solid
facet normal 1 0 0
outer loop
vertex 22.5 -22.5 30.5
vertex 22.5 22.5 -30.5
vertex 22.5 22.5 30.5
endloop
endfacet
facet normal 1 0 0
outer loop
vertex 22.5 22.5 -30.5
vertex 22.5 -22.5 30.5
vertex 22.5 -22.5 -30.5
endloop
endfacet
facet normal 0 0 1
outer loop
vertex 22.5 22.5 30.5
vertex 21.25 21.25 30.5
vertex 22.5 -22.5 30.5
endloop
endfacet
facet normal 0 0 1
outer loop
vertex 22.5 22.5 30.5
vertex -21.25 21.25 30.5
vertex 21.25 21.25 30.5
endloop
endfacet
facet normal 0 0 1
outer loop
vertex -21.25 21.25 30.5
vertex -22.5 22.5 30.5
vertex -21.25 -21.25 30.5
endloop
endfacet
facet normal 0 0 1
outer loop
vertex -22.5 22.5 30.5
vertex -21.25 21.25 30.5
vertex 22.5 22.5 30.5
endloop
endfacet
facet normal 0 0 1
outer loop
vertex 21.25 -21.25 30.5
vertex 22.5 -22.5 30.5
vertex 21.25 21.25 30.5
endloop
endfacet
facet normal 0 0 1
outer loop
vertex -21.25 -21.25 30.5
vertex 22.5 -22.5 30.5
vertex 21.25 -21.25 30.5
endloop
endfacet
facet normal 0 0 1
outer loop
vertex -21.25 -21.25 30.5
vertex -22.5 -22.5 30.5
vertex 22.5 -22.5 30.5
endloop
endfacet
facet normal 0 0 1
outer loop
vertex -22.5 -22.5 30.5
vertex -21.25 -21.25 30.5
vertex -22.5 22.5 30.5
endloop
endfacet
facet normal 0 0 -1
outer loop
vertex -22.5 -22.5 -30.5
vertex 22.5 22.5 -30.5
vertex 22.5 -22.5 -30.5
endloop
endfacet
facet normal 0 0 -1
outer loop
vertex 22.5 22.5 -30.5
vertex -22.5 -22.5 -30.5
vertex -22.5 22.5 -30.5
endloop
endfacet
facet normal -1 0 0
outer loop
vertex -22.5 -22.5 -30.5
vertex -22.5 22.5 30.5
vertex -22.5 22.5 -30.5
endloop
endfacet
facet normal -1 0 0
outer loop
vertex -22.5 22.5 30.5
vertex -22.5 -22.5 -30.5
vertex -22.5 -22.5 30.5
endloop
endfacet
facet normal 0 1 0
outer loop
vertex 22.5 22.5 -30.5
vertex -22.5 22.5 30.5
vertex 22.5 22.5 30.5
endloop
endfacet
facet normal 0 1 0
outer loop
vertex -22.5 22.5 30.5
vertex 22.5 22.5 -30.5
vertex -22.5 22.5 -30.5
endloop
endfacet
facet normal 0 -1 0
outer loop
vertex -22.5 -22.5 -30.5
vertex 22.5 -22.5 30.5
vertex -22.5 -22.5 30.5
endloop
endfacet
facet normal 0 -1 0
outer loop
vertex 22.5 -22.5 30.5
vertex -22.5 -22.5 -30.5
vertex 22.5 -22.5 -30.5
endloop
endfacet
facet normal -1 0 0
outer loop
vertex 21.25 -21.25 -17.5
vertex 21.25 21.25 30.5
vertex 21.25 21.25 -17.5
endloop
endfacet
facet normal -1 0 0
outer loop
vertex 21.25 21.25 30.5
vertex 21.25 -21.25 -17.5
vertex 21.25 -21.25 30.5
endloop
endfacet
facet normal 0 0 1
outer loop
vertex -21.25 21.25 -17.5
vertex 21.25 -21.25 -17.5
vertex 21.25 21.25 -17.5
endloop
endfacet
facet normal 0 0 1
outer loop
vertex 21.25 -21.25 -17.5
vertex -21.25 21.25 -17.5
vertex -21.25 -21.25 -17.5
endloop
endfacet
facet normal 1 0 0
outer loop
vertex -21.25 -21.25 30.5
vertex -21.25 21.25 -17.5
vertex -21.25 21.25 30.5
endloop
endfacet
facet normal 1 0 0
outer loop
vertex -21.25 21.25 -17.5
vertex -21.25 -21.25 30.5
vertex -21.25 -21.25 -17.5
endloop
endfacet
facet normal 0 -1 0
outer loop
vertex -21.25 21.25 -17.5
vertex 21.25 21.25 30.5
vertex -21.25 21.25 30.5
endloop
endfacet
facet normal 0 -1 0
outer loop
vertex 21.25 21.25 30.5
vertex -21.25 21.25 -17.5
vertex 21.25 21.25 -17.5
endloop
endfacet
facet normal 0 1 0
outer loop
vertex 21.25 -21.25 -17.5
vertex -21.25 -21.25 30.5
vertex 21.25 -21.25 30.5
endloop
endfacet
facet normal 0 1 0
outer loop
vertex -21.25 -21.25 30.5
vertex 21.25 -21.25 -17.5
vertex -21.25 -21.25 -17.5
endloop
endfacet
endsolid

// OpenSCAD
width = 42;
length = 48;
spool_bottom_from_bot = length + 24-15;
desired_height = 70;
thickness = 3;
tol = 0.5;


pad_height = desired_height - spool_bottom_from_bot;



difference()
{
    cube(size = [width + thickness, width + thickness, length+pad_height], center = true);
    
    translate(v = [0, 0, pad_height/2])
        cube(size = [width+tol, width+tol, length], center = true);
}
